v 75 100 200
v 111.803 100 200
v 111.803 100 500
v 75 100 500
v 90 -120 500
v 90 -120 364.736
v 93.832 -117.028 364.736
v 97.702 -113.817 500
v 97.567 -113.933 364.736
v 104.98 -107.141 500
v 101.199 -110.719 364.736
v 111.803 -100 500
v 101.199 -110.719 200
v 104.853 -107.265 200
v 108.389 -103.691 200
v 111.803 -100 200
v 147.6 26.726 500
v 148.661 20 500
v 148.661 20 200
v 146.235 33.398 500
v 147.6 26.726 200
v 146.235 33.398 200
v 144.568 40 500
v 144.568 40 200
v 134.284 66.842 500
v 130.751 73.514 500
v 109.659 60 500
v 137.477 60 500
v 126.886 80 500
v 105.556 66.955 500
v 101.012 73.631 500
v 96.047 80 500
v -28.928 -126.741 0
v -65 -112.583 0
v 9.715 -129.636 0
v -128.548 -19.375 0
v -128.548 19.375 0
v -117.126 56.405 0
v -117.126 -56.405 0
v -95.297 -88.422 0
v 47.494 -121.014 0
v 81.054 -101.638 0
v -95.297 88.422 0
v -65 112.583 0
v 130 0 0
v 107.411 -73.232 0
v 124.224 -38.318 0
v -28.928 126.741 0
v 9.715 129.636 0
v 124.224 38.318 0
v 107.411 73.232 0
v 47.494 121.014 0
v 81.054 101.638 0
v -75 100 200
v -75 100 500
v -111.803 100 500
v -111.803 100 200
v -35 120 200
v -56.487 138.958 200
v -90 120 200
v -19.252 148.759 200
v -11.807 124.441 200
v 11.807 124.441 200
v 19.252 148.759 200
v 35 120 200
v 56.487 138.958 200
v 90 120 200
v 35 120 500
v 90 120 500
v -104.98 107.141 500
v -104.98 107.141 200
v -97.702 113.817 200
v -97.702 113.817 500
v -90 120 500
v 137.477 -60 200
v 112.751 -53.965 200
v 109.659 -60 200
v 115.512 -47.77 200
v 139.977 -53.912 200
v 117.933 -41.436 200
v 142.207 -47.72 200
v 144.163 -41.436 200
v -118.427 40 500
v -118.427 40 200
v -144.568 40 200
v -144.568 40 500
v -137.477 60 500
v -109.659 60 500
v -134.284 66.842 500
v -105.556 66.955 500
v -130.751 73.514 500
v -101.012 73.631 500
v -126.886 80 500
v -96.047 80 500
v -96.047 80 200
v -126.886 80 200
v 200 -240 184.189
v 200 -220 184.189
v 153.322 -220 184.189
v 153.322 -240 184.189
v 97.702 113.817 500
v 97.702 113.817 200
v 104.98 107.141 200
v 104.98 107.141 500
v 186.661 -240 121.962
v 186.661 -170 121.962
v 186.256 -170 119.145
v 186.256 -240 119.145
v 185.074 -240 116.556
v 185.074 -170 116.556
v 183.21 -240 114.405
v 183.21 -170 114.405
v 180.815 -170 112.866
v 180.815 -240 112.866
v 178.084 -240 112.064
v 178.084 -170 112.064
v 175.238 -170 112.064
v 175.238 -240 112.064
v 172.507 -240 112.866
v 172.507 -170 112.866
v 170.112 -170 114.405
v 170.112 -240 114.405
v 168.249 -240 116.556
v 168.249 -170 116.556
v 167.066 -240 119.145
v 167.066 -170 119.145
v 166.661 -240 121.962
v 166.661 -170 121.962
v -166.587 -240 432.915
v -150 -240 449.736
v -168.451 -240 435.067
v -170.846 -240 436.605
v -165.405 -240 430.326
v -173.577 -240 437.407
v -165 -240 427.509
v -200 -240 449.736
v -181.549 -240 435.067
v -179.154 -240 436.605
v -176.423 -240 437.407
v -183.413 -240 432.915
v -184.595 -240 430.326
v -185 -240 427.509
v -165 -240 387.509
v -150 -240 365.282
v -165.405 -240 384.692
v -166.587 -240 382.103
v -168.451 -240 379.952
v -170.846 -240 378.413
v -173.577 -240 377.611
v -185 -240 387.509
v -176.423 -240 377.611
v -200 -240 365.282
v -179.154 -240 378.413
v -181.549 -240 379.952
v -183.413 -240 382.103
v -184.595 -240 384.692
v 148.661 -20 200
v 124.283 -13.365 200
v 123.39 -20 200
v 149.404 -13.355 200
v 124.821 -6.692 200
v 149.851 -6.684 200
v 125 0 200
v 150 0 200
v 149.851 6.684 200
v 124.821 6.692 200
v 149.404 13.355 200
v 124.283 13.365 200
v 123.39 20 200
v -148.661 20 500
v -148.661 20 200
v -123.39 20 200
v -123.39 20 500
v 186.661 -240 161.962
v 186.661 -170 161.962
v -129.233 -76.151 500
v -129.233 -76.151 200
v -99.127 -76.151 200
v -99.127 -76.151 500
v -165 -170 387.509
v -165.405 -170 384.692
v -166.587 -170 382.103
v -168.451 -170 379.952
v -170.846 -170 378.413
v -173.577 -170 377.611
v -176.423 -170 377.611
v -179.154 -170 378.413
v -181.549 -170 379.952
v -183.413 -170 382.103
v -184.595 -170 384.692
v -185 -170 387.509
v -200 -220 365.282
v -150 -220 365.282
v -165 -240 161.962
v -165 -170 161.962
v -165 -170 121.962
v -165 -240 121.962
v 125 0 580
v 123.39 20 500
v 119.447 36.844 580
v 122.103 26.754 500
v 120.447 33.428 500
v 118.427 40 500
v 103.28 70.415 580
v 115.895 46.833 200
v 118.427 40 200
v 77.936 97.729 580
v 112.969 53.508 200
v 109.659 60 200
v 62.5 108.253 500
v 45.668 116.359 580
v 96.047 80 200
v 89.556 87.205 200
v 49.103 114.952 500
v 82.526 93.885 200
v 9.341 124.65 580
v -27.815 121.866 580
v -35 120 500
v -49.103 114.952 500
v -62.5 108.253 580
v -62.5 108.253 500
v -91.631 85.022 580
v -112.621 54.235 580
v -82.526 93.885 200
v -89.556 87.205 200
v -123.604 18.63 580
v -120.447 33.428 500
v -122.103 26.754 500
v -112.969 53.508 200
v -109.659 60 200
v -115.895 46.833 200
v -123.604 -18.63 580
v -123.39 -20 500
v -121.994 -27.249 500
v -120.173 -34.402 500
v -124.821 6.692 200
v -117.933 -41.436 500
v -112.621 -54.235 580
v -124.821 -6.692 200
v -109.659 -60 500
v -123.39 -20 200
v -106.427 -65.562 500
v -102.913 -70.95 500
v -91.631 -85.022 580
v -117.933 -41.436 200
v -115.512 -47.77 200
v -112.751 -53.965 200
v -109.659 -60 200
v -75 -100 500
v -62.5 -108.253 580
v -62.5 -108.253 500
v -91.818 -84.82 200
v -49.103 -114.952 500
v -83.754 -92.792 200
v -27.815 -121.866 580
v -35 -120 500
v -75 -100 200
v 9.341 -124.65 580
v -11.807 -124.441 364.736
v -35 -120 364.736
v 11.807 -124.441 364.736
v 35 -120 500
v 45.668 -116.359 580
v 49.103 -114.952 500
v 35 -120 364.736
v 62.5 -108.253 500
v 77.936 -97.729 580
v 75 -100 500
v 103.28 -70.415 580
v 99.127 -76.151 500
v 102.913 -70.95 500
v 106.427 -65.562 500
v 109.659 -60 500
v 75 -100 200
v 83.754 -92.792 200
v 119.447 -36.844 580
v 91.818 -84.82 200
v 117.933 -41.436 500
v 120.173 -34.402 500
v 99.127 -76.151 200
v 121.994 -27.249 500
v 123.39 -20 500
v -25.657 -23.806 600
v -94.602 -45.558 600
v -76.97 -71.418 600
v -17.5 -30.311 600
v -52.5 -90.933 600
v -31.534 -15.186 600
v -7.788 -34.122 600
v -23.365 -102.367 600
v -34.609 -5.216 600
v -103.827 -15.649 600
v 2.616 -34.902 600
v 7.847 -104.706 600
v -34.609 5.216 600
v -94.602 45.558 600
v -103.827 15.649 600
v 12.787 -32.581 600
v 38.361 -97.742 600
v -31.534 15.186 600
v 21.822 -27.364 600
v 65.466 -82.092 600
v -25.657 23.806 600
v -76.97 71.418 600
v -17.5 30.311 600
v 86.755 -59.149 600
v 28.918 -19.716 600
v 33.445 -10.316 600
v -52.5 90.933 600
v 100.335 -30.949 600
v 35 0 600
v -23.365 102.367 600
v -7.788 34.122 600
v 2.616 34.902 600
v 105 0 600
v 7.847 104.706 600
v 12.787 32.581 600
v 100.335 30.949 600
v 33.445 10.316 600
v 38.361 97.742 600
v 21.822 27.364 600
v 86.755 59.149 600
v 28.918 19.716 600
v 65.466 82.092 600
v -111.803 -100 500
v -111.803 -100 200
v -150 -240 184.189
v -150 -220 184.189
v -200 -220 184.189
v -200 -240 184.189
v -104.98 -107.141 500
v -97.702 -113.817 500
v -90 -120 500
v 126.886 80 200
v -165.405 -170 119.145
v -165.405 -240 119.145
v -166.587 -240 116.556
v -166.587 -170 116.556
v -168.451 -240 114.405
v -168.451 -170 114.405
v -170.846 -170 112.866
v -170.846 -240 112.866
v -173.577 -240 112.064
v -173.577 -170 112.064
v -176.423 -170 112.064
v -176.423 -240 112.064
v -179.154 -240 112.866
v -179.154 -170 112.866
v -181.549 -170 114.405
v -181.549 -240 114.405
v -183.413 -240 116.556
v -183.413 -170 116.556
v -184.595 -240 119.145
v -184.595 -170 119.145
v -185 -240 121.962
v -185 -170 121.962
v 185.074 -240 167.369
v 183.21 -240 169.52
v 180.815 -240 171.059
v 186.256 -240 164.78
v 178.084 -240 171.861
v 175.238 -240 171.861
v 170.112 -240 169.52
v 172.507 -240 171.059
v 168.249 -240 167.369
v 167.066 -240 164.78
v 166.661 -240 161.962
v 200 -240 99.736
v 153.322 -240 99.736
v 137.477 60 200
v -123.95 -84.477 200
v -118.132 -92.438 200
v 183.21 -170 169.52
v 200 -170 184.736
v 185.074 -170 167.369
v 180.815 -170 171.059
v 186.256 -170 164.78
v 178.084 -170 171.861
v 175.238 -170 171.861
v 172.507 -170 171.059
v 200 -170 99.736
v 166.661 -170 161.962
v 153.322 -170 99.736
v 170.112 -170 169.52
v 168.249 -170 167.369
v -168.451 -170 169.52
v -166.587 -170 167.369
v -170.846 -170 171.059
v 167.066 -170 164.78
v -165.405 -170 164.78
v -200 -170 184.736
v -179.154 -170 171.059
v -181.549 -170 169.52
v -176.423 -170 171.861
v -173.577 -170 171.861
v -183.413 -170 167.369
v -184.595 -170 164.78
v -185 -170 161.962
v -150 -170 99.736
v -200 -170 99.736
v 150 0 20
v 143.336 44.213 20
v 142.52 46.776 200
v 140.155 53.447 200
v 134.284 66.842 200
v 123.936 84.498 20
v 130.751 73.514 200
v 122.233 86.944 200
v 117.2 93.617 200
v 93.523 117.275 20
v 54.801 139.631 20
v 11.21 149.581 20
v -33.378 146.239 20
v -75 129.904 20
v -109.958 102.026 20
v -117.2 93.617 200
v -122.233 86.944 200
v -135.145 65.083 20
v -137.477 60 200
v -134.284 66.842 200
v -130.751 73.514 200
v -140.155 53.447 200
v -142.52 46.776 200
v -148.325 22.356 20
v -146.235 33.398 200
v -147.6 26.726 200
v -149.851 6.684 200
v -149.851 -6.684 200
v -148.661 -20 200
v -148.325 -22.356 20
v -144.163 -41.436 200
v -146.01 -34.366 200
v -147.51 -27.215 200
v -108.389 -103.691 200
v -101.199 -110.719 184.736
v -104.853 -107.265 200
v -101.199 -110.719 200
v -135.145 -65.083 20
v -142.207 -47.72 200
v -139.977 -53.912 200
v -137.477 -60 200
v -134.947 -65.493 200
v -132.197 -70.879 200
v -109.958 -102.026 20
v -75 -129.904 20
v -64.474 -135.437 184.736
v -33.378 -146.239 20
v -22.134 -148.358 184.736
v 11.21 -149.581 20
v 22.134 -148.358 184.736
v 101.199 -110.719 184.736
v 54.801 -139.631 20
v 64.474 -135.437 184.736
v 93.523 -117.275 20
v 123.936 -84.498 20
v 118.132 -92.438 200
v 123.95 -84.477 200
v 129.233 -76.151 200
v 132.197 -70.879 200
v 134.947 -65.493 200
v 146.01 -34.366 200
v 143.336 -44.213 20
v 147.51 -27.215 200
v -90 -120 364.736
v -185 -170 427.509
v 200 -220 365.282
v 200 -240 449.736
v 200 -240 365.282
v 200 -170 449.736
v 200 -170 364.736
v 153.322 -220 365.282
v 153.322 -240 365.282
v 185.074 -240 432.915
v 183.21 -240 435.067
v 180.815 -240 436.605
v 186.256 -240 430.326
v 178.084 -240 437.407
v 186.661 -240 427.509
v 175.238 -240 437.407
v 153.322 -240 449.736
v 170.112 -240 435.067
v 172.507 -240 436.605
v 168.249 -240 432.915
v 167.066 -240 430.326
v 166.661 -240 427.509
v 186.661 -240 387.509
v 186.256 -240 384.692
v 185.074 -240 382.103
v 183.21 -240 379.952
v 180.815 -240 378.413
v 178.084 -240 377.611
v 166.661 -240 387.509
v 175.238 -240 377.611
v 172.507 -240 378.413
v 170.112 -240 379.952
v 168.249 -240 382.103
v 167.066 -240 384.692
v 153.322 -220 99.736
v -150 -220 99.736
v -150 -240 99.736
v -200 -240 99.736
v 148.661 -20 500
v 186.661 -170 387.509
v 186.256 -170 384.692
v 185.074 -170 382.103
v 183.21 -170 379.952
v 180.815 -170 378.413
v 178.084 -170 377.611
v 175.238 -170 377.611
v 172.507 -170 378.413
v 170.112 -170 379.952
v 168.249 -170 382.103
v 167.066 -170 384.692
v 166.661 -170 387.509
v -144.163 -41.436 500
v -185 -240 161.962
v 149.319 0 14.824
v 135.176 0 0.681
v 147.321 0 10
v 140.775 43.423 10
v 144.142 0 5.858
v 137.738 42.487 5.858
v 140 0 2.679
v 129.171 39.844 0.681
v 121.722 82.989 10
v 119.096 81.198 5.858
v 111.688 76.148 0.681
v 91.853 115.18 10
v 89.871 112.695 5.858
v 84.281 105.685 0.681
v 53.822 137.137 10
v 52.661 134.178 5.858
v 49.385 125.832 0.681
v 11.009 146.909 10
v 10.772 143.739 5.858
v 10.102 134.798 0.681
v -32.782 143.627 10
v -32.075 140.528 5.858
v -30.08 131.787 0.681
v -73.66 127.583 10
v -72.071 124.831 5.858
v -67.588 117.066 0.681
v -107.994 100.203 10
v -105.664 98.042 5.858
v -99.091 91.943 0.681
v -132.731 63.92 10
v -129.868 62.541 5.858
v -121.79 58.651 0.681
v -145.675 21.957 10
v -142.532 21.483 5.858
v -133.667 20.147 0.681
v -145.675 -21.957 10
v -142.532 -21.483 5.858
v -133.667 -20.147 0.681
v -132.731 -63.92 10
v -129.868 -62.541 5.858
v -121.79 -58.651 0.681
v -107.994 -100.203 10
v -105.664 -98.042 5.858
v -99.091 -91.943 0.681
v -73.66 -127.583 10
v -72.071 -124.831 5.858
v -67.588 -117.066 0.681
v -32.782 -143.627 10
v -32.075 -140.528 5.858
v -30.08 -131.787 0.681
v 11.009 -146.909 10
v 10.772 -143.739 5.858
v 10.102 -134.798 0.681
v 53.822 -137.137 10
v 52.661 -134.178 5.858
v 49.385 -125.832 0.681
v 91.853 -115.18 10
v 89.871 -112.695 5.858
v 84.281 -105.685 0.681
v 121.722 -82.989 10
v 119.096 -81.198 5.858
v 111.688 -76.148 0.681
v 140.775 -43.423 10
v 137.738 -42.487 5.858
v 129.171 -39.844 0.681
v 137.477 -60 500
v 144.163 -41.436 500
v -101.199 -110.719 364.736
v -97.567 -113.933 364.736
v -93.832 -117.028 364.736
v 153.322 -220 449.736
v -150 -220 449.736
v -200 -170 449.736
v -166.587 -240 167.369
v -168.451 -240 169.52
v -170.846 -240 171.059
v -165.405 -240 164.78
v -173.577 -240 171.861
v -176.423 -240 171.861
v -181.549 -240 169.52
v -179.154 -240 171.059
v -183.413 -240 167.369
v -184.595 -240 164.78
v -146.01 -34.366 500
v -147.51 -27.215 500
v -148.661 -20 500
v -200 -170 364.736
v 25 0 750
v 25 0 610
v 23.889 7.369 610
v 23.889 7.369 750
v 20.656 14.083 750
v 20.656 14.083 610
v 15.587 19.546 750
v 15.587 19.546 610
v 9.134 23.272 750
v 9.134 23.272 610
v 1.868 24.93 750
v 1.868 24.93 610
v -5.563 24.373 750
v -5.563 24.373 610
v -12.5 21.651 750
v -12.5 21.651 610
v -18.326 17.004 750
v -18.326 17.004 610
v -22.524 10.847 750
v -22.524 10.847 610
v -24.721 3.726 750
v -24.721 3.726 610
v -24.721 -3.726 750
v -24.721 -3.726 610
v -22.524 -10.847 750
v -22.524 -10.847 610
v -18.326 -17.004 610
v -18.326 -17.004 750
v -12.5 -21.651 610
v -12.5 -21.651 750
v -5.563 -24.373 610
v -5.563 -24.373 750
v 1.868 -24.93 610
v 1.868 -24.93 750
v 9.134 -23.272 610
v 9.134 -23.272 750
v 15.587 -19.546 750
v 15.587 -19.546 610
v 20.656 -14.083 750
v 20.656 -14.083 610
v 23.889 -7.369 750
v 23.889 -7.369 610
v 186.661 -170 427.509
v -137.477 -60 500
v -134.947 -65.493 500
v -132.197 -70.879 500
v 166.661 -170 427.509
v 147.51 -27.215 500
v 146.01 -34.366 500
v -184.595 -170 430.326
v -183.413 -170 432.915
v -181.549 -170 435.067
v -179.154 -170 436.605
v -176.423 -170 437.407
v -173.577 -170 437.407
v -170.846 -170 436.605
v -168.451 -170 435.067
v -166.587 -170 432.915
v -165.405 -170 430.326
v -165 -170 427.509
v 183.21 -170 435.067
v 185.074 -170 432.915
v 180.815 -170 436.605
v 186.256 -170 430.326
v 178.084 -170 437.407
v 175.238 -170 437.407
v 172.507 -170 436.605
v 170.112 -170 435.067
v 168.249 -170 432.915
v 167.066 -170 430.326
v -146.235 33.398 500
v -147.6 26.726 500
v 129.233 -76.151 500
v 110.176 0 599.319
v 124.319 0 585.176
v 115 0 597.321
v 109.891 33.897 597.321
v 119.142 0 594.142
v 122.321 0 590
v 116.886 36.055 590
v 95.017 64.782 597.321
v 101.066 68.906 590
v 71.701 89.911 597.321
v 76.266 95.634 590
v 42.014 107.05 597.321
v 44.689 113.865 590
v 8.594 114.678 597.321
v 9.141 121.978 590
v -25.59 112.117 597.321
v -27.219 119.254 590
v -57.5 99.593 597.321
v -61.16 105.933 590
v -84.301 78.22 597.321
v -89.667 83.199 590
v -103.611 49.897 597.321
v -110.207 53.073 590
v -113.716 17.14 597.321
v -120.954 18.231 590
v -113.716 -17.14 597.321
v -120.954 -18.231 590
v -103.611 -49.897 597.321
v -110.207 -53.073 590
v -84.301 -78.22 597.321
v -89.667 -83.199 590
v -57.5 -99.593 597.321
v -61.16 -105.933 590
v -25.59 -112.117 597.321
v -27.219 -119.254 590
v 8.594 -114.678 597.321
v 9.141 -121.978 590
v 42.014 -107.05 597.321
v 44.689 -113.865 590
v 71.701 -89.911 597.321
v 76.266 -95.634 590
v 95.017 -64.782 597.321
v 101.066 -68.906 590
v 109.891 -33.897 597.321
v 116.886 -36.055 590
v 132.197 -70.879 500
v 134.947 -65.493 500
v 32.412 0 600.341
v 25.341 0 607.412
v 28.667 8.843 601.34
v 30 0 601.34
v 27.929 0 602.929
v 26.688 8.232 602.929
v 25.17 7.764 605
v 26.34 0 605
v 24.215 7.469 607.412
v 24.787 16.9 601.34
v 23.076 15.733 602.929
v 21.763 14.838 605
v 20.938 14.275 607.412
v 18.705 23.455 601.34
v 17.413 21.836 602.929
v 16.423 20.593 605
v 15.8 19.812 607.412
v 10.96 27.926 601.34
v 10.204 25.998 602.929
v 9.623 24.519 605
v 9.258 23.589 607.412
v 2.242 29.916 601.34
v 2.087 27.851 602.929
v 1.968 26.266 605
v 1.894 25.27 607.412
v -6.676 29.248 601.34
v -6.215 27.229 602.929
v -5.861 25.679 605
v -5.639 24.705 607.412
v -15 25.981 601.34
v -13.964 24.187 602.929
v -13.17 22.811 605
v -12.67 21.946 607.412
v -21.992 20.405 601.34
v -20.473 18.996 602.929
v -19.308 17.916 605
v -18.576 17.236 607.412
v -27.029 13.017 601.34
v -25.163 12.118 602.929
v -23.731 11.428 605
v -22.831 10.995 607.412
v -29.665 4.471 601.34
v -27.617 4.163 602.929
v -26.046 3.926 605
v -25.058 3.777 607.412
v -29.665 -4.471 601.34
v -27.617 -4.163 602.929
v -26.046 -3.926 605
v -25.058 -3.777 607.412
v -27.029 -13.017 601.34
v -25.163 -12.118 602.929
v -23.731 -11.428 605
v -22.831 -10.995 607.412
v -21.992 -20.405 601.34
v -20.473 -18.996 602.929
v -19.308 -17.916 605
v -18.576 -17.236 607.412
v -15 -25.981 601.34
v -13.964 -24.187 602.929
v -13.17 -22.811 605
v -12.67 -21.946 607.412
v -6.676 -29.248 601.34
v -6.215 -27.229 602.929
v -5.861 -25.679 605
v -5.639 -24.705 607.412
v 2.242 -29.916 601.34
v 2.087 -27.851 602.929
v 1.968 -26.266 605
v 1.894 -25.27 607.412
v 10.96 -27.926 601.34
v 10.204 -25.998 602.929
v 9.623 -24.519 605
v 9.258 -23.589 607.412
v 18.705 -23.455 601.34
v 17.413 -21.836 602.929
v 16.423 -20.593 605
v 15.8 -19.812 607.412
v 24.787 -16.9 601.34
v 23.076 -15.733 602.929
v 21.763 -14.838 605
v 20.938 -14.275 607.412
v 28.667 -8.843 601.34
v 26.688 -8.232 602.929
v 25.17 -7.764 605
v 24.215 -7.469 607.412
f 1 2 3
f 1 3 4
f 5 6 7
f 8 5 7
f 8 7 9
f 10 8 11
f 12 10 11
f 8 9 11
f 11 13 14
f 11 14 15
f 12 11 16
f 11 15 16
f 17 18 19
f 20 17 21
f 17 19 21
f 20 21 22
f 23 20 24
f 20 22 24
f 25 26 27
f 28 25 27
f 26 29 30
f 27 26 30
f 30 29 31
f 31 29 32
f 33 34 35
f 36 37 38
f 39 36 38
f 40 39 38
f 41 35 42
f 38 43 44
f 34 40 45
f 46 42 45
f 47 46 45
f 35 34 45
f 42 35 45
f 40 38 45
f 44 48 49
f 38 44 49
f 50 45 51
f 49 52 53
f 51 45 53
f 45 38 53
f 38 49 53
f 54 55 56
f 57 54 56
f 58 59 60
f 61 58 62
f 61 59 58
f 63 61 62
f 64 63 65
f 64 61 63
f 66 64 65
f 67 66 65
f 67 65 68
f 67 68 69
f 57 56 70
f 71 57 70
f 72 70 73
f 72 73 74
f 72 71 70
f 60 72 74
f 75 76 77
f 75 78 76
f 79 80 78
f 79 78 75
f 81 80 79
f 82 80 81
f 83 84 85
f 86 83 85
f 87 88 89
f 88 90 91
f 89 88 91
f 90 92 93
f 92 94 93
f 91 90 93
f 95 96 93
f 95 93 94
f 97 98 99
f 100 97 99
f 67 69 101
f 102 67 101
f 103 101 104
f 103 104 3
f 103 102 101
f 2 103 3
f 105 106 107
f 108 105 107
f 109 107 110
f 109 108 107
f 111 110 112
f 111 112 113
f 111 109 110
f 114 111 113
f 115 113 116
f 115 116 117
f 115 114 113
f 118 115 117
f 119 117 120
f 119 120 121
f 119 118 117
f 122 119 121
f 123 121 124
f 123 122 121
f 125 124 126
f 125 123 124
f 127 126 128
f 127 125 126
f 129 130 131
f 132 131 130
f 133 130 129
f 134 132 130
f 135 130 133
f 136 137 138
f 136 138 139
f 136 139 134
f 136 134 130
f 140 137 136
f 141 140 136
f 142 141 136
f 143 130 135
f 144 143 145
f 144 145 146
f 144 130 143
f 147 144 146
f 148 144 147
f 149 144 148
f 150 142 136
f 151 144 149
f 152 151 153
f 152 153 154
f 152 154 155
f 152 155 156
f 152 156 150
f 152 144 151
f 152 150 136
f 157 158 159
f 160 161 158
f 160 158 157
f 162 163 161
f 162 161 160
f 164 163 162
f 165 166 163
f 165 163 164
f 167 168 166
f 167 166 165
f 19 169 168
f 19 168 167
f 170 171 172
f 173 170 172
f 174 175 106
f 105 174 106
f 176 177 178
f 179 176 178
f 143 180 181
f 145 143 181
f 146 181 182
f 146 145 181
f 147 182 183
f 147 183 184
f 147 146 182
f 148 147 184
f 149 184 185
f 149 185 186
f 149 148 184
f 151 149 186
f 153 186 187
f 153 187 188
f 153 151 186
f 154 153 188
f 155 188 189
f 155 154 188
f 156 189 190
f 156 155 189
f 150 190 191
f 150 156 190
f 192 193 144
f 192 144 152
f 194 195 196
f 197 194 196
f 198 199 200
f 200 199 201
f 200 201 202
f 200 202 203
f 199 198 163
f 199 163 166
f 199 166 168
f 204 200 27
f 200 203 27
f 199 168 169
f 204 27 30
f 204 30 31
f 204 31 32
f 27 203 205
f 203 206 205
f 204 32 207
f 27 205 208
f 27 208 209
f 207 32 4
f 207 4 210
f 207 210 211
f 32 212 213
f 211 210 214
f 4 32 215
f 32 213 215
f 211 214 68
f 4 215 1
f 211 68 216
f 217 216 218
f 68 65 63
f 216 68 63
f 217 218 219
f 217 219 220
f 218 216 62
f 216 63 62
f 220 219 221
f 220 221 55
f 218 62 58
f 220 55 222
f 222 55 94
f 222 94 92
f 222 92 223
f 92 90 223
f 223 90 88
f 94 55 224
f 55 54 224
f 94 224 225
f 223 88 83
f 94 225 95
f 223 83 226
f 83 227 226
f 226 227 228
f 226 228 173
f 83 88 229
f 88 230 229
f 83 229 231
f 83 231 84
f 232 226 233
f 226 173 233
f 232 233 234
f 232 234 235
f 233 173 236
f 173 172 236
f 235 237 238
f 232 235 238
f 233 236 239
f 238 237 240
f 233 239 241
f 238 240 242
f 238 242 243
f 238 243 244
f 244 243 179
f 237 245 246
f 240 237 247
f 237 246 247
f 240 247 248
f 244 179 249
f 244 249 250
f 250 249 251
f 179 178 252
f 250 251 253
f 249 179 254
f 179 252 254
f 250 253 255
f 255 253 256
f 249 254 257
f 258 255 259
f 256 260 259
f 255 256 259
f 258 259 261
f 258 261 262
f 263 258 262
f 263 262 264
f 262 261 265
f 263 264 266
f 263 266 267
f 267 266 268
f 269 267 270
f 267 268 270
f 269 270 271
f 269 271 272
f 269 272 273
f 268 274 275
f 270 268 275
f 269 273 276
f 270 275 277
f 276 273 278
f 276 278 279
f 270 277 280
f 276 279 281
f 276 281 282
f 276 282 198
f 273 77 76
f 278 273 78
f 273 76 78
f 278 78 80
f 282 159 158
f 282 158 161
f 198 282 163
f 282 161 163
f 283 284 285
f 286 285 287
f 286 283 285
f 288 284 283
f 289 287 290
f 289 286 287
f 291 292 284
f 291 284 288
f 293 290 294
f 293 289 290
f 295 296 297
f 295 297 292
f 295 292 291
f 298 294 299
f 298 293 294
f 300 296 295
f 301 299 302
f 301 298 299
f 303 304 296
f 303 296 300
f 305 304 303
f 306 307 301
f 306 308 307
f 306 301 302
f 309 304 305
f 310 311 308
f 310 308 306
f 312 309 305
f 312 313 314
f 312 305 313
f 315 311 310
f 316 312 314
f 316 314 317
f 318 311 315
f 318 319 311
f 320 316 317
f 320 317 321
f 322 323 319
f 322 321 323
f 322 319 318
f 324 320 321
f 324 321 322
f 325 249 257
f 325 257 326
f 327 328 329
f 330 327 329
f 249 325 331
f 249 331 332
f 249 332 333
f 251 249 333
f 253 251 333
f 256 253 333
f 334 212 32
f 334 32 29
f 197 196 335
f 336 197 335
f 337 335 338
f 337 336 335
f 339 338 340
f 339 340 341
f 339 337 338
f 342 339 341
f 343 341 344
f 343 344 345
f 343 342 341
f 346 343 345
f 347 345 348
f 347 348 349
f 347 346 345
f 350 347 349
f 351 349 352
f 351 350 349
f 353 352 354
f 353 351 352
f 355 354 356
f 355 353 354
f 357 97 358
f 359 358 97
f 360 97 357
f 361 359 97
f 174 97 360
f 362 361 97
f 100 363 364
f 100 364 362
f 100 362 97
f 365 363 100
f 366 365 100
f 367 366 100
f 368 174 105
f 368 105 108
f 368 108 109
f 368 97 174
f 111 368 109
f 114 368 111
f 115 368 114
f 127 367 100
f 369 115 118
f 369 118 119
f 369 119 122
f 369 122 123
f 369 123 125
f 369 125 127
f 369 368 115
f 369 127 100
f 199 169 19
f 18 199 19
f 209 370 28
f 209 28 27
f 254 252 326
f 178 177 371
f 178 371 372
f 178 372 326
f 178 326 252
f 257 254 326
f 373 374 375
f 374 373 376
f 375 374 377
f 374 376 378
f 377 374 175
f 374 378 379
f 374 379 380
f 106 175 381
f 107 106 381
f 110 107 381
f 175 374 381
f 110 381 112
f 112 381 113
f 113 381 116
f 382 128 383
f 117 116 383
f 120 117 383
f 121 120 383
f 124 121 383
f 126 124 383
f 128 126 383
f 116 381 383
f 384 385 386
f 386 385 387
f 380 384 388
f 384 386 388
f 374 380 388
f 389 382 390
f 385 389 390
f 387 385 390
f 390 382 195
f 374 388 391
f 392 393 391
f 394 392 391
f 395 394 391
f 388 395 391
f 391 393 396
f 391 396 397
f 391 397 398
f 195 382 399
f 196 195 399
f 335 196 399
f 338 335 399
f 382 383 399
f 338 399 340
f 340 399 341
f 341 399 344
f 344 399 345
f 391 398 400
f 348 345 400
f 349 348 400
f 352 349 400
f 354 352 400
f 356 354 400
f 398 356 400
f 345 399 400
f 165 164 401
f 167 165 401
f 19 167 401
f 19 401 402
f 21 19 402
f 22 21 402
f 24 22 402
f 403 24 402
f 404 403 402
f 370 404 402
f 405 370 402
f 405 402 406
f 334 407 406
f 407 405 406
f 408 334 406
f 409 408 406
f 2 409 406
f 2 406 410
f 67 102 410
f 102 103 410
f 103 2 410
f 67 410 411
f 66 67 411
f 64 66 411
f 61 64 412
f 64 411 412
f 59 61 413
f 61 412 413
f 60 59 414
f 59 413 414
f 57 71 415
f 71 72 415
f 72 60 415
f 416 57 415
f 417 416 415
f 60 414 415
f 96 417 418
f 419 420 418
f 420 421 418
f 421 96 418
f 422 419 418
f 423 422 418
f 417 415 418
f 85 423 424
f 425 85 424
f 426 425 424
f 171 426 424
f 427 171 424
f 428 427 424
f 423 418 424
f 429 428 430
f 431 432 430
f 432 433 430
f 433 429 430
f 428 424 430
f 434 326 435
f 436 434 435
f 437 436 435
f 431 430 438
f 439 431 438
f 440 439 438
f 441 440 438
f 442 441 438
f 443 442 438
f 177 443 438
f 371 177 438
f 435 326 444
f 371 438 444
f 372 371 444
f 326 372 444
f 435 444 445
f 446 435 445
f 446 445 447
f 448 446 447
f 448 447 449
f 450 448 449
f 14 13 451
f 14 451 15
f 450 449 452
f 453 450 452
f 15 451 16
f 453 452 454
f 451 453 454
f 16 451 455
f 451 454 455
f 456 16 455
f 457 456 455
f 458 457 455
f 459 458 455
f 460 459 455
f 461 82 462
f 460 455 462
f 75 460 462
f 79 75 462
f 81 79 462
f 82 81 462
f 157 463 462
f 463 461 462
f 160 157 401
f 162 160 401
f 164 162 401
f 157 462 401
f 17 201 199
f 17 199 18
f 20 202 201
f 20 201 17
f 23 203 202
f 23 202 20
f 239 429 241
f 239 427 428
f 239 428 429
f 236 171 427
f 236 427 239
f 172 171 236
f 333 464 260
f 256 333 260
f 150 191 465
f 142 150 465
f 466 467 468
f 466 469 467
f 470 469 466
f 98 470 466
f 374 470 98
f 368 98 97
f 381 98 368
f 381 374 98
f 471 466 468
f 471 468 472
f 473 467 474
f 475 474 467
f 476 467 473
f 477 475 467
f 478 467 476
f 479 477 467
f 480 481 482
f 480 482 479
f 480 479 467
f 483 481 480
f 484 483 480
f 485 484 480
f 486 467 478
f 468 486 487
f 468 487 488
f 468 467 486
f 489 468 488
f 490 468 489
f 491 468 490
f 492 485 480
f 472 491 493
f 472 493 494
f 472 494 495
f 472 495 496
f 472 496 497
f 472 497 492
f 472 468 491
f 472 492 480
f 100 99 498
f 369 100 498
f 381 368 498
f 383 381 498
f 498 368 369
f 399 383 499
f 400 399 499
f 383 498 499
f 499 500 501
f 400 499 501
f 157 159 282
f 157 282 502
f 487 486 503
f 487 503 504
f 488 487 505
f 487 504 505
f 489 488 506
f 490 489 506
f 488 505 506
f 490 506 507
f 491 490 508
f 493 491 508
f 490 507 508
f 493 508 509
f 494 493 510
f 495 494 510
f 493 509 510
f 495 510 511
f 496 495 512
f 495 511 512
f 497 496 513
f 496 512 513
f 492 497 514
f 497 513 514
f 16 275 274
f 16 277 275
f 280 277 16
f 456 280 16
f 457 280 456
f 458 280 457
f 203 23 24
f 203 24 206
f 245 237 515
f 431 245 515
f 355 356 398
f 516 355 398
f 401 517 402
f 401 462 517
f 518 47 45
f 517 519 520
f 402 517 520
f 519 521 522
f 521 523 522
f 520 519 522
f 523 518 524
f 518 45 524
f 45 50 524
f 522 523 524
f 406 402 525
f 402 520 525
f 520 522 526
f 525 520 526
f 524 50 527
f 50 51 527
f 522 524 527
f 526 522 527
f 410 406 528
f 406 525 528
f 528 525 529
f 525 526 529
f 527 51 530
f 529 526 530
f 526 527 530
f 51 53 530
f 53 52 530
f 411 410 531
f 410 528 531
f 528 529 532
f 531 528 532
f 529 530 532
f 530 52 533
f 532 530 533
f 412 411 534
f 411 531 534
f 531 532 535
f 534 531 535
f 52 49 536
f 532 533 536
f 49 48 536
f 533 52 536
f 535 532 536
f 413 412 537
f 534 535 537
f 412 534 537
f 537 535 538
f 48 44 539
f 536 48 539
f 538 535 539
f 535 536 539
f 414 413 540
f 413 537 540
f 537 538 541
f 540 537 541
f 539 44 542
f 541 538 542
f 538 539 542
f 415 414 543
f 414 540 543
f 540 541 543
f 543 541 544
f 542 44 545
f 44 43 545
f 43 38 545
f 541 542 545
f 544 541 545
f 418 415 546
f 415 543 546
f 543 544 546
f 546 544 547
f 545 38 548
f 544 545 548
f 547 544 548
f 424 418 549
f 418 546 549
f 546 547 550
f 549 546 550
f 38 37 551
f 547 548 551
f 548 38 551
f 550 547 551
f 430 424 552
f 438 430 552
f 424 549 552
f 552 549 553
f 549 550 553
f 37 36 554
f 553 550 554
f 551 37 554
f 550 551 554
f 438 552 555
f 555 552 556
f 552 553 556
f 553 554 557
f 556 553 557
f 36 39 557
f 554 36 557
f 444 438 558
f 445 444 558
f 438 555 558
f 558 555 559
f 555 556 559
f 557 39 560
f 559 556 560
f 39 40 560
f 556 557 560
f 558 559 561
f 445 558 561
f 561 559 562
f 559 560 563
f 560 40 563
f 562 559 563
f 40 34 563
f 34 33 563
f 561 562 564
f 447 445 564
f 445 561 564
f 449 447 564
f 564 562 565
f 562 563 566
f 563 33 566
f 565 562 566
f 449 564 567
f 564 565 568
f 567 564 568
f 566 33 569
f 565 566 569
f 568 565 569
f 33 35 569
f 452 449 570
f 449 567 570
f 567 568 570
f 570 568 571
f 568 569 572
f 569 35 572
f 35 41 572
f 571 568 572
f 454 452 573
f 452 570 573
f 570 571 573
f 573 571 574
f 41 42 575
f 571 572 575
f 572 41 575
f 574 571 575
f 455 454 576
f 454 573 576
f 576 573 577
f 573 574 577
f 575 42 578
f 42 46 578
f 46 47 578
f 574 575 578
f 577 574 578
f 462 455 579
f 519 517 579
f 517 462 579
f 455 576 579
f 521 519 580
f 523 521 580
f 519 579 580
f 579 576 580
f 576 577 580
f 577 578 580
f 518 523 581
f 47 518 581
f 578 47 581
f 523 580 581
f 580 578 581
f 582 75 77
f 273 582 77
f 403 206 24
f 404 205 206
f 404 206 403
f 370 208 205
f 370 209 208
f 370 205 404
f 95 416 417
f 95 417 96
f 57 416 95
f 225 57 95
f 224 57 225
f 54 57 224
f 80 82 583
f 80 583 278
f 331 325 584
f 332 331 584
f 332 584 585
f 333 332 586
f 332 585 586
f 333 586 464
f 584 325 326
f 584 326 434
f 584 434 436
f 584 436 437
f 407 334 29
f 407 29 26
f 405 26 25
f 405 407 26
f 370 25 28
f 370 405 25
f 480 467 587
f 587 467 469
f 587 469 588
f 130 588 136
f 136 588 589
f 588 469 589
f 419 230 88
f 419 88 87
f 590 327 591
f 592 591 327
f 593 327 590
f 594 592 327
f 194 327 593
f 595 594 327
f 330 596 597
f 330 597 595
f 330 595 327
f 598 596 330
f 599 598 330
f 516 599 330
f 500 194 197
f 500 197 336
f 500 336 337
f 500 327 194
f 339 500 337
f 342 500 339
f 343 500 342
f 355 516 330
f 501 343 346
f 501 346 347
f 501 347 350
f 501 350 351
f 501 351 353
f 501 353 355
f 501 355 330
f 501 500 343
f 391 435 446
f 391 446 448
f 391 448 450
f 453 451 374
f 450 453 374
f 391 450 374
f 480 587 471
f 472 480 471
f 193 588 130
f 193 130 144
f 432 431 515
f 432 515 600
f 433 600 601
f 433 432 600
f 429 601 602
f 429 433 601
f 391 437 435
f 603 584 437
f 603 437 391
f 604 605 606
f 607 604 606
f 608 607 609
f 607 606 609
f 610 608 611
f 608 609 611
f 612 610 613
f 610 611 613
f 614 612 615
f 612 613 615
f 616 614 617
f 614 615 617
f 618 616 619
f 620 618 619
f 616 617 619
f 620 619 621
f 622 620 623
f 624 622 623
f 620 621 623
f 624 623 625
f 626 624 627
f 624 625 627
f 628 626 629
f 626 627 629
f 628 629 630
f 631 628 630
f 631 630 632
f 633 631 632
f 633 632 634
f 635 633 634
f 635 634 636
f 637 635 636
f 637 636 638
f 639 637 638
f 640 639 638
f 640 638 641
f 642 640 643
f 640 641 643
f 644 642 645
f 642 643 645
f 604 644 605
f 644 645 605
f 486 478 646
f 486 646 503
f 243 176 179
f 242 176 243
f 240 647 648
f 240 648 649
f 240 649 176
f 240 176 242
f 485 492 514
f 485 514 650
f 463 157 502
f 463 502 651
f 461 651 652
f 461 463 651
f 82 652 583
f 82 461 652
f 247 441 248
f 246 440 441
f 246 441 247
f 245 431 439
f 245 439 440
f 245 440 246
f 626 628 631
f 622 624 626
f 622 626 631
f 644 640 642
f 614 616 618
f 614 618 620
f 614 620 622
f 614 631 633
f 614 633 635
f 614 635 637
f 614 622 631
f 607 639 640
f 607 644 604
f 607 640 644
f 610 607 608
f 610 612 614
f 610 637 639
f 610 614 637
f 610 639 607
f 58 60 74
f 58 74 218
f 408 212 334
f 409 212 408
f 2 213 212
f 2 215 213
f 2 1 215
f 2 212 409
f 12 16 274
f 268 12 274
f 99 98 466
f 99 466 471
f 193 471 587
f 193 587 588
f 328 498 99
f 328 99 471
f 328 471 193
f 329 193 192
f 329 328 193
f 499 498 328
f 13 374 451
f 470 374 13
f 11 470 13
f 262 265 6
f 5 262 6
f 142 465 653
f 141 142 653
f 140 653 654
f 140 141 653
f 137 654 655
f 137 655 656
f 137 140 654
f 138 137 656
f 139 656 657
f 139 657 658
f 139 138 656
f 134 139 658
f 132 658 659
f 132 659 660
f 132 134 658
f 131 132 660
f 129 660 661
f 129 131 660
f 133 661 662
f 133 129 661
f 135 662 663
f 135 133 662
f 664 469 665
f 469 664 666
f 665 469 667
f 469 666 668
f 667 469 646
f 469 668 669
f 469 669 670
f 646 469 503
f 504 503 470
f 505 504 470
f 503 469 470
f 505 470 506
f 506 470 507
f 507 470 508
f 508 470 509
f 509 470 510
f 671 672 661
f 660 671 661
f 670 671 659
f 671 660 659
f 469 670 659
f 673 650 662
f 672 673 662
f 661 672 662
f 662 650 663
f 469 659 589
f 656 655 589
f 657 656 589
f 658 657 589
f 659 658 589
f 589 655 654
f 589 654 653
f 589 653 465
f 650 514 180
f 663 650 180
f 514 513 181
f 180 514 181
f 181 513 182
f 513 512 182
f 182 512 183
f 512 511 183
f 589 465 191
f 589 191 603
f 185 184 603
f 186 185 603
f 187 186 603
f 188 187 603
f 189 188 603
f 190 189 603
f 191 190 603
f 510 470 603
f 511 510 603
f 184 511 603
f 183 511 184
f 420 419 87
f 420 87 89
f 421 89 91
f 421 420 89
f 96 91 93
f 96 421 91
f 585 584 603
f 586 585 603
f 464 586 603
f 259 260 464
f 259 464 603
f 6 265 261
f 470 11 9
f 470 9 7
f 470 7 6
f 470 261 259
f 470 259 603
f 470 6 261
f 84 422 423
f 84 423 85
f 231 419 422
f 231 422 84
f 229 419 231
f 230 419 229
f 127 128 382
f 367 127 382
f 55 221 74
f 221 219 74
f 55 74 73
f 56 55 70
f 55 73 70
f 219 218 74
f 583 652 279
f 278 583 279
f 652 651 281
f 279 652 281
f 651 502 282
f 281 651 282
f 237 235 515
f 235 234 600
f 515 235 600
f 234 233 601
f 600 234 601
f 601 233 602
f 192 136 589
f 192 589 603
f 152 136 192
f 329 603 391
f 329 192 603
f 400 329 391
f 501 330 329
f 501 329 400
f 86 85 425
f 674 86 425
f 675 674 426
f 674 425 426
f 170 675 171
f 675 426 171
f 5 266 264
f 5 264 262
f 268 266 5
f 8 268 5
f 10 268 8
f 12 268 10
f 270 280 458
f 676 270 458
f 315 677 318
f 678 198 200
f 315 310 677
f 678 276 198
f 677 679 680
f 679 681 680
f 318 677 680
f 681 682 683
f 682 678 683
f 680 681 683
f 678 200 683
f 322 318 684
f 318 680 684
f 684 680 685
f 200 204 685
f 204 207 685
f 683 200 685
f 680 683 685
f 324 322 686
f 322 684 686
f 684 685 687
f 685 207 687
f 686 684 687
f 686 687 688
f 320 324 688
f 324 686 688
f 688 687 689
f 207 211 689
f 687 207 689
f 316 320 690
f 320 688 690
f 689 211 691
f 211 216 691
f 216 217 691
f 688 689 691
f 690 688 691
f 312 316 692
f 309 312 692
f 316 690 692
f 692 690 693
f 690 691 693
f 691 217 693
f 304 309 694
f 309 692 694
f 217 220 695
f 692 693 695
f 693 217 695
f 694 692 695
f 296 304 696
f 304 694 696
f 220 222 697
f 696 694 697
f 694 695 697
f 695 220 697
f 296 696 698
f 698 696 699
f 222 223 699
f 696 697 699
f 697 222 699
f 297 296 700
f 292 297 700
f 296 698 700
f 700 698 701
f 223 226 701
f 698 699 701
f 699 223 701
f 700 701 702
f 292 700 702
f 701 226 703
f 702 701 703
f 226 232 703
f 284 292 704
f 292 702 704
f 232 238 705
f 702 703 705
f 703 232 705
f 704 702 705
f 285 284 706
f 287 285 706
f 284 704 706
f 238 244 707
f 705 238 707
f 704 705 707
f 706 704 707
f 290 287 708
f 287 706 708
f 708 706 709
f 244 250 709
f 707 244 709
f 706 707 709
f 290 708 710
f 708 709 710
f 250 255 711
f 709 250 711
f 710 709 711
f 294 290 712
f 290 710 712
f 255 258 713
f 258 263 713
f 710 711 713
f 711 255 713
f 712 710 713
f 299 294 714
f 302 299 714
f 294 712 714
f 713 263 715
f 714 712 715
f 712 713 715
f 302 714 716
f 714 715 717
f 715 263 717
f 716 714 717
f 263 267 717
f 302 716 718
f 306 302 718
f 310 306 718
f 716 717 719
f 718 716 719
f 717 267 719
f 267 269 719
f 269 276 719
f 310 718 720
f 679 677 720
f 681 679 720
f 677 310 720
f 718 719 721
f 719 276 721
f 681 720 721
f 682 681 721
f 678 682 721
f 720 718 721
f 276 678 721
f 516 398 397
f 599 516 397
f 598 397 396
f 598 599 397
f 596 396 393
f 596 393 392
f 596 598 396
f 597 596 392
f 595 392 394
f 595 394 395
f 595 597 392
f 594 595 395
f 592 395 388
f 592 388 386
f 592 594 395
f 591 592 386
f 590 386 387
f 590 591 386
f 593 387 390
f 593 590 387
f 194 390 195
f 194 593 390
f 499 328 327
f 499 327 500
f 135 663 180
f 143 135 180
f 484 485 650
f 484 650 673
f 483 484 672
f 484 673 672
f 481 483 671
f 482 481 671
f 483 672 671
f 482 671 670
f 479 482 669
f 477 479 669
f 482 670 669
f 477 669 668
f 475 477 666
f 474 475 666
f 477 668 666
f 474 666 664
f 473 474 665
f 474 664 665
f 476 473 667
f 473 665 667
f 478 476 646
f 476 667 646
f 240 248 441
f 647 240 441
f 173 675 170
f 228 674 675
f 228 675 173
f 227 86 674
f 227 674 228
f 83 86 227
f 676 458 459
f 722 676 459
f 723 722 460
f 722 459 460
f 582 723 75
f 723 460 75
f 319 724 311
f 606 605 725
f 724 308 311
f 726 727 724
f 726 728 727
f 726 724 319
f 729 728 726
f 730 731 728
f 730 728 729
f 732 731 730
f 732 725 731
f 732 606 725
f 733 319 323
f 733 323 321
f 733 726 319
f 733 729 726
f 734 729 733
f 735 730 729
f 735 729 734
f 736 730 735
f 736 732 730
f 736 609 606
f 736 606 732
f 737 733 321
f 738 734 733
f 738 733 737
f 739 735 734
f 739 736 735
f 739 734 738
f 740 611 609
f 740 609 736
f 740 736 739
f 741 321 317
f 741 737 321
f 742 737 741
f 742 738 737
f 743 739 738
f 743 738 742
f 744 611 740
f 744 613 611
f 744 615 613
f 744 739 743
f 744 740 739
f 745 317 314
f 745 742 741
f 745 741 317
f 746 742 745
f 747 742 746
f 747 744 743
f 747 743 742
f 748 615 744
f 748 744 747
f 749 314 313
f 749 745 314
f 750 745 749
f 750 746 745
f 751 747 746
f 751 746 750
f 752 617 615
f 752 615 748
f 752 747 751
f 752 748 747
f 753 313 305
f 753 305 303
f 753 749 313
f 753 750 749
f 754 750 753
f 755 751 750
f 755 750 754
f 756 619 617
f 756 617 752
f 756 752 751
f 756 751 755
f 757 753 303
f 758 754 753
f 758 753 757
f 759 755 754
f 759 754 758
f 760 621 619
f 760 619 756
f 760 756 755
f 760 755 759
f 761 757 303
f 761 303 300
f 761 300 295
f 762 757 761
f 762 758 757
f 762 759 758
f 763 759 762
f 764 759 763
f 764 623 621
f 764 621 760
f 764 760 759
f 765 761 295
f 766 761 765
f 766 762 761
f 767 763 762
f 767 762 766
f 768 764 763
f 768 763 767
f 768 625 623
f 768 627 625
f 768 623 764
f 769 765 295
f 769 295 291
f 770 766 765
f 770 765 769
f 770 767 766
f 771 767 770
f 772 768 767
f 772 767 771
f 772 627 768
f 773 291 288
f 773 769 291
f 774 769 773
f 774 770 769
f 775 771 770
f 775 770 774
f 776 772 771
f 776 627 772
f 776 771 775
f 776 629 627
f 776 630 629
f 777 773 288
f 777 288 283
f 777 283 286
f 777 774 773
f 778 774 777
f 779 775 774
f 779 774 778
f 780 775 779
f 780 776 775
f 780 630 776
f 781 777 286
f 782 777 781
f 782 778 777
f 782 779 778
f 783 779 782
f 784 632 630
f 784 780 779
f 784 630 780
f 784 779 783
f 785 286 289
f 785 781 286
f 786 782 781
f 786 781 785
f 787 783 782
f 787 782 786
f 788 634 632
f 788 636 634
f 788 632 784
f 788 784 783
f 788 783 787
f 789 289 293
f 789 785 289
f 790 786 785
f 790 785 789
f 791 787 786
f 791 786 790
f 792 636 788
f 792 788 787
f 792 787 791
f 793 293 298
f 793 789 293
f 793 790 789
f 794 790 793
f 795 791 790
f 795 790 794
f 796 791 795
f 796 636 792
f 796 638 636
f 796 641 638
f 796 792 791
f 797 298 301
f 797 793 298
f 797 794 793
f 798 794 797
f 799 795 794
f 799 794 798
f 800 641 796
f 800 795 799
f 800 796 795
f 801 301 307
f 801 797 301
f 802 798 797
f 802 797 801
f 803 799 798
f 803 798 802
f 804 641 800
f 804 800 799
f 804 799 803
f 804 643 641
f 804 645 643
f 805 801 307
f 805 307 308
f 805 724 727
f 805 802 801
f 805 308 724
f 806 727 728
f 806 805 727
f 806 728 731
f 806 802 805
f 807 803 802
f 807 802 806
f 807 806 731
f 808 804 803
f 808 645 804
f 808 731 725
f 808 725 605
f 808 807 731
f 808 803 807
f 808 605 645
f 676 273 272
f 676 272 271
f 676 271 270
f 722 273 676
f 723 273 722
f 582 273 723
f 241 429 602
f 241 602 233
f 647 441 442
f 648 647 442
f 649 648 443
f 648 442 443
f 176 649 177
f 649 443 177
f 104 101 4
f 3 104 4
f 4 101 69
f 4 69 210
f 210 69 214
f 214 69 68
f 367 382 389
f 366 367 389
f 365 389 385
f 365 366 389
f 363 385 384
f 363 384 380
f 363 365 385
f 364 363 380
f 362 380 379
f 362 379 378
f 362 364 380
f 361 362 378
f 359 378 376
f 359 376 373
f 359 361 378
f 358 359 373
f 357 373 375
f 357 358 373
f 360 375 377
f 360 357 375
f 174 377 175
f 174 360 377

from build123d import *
from build123d.topology import SkipClean

# Parameters (mm, degrees)
SKETCH1_R            = 150
BOSS_EXTRUDE1_DEPTH  = 200
BOSS_EXTRUDE11_DEPTH = 300
BOSS_EXTRUDE14_START = -300
SKETCH12_R           = 125
BOSS_EXTRUDE14_DEPTH = 400
SKETCH13_W           = 46.677917496
SKETCH13_H           = 84.453402707
SKETCH13_H_2         = 84.453402706
SKETCH13_W_2         = 50
BOSS_EXTRUDE15_DEPTH = 50
SKETCH13_3_W         = 46.677917496
SKETCH13_3_H         = 84.453402706
SKETCH13_3_H_2       = 84.453402707
SKETCH13_3_W_2       = 50
BOSS_EXTRUDE16_DEPTH = 20
BOSS_EXTRUDE17_DEPTH = 90
SKETCH16_R           = 25
BOSS_EXTRUDE18_DEPTH = 150
FILLET2_R            = 10
FILLET3_R            = 20


with BuildPart() as part:
    # Sketch1 → Boss-Extrude1 (new body)
    with BuildSketch(Plane.XY):
        Circle(SKETCH1_R)
    extrude(amount=BOSS_EXTRUDE1_DEPTH)

    # Sketch7 → Boss-Extrude11 (add)
    with SkipClean():  # the faces are left unmerged after this step: merging them gives an invalid solid
        with BuildSketch(Plane.XY.offset(200)):
            with BuildLine():
                Line((-90, 120), (90, 120))
                ThreePointArc((90, 120), (101.396020382, 110.538893837), (111.803398875, 100))
                Line((111.803398875, 100), (-111.803398875, 100))
                ThreePointArc((-111.803398875, 100), (-101.396020382, 110.538893837), (-90, 120))
            make_face()
            with BuildLine():
                Line((-126.885775404, 80), (126.885775404, 80))
                ThreePointArc((126.885775404, 80), (132.559251115, 70.200035213), (137.477270849, 60))
                Line((137.477270849, 60), (-137.477270849, 60))
                ThreePointArc((-137.477270849, 60), (-132.559251115, 70.200035213), (-126.885775404, 80))
            make_face()
            with BuildLine():
                Line((144.16342013, -41.435592144), (-144.16342013, -41.435592144))
                ThreePointArc((-144.16342013, -41.435592144), (-146.803816882, -30.799989431), (-148.660687473, -20))
                Line((-148.660687473, -20), (148.660687473, -20))
                ThreePointArc((148.660687473, -20), (146.803816882, -30.799989431), (144.16342013, -41.435592144))
            make_face()
            with BuildLine():
                Line((111.803398875, -100), (-111.803398875, -100))
                ThreePointArc((-111.803398875, -100), (-101.396020382, -110.538893837), (-90, -120))
                Line((-90, -120), (90, -120))
                ThreePointArc((90, -120), (101.396020382, -110.538893837), (111.803398875, -100))
            make_face()
            with BuildLine():
                Line((144.568322948, 40), (-144.568322948, 40))
                ThreePointArc((-144.568322948, 40), (-146.955139883, 30.069700063), (-148.660687473, 20))
                Line((-148.660687473, 20), (148.660687473, 20))
                ThreePointArc((148.660687473, 20), (146.955139883, 30.069700063), (144.568322948, 40))
            make_face()
            with BuildLine():
                Line((137.477270849, -60), (-137.477270849, -60))
                ThreePointArc((-137.477270849, -60), (-133.599215205, -68.20007109), (-129.232599216, -76.150740639))
                Line((-129.232599216, -76.150740639), (129.232599216, -76.150740639))
                ThreePointArc((129.232599216, -76.150740639), (133.599215205, -68.20007109), (137.477270849, -60))
            make_face()
        extrude(amount=BOSS_EXTRUDE11_DEPTH)



with BuildPart() as body_2:
    # Sketch12 → Boss-Extrude14 (new body)
    with BuildSketch(Plane.XY.offset(500).offset(BOSS_EXTRUDE14_START)):
        Circle(SKETCH12_R)
    extrude(amount=BOSS_EXTRUDE14_DEPTH)


with BuildPart() as body_3:
    # Sketch13 → Boss-Extrude15 (new body)
    # profile 1 of 5: a face of its own
    with BuildSketch(Plane(origin=(0, -220, 0), x_dir=(-1, 0, 0), z_dir=(0, -1, 0))):
        Polygon((150, -99.735715433), (-153.322082504, -99.735715433), (-153.322082504, -184.18911814), (-200, -184.18911814), (-200, -365.282312727), (-153.322082504, -365.282312727), (-153.322082504, -449.735715433), (150, -449.735715433), (150, -365.282312727), (200, -365.282312727), (200, -184.18911814), (150, -184.18911814), align=None)
    # profile 2 of 5: a face of its own
    with BuildSketch(Plane(origin=(0, -220, 0), x_dir=(-1, 0, 0), z_dir=(0, -1, 0))):
        with Locations((-176.661041252, -141.962416787)):
            Rectangle(SKETCH13_W, SKETCH13_H)
        with BuildLine():
            ThreePointArc((-186.661041252, -121.962416787), (-176.661041252, -111.962416787), (-166.661041252, -121.962416787))
            Line((-166.661041252, -121.962416787), (-166.661041252, -161.962416787))
            ThreePointArc((-166.661041252, -161.962416787), (-176.661041252, -171.962416787), (-186.661041252, -161.962416787))
            Line((-186.661041252, -161.962416787), (-186.661041252, -121.962416787))
        make_face(mode=Mode.SUBTRACT)
    # profile 3 of 5: a face of its own
    with BuildSketch(Plane(origin=(0, -220, 0), x_dir=(-1, 0, 0), z_dir=(0, -1, 0))):
        with Locations((-176.661041252, -407.50901408)):
            Rectangle(SKETCH13_W, SKETCH13_H_2)
        with BuildLine():
            Line((-166.661041252, -387.50901408), (-166.661041252, -427.50901408))
            ThreePointArc((-166.661041252, -427.50901408), (-176.661041252, -437.50901408), (-186.661041252, -427.50901408))
            Line((-186.661041252, -427.50901408), (-186.661041252, -387.50901408))
            ThreePointArc((-186.661041252, -387.50901408), (-176.661041252, -377.50901408), (-166.661041252, -387.50901408))
        make_face(mode=Mode.SUBTRACT)
    # profile 4 of 5: a face of its own
    with BuildSketch(Plane(origin=(0, -220, 0), x_dir=(-1, 0, 0), z_dir=(0, -1, 0))):
        with Locations((175, -407.50901408)):
            Rectangle(SKETCH13_W_2, SKETCH13_H_2)
        with BuildLine():
            Line((185, -387.50901408), (185, -427.50901408))
            ThreePointArc((185, -427.50901408), (175, -437.50901408), (165, -427.50901408))
            Line((165, -427.50901408), (165, -387.50901408))
            ThreePointArc((165, -387.50901408), (175, -377.50901408), (185, -387.50901408))
        make_face(mode=Mode.SUBTRACT)
    # profile 5 of 5: a face of its own
    with BuildSketch(Plane(origin=(0, -220, 0), x_dir=(-1, 0, 0), z_dir=(0, -1, 0))):
        with Locations((175, -141.962416787)):
            Rectangle(SKETCH13_W_2, SKETCH13_H)
        with BuildLine():
            ThreePointArc((165, -121.962416787), (175, -111.962416787), (185, -121.962416787))
            Line((185, -121.962416787), (185, -161.962416787))
            ThreePointArc((185, -161.962416787), (175, -171.962416787), (165, -161.962416787))
            Line((165, -161.962416787), (165, -121.962416787))
        make_face(mode=Mode.SUBTRACT)
    extrude(amount=-BOSS_EXTRUDE15_DEPTH)

    # Sketch13<3> → Boss-Extrude16 (add)
    # profile 1 of 4: a face of its own
    with BuildSketch(Plane(origin=(0, -220, 0), x_dir=(-1, 0, 0), z_dir=(0, -1, 0))):
        with Locations((-176.661041252, -407.50901408)):
            Rectangle(SKETCH13_3_W, SKETCH13_3_H)
        with BuildLine():
            Line((-166.661041252, -387.50901408), (-166.661041252, -427.50901408))
            ThreePointArc((-166.661041252, -427.50901408), (-176.661041252, -437.50901408), (-186.661041252, -427.50901408))
            Line((-186.661041252, -427.50901408), (-186.661041252, -387.50901408))
            ThreePointArc((-186.661041252, -387.50901408), (-176.661041252, -377.50901408), (-166.661041252, -387.50901408))
        make_face(mode=Mode.SUBTRACT)
    # profile 2 of 4: a face of its own
    with BuildSketch(Plane(origin=(0, -220, 0), x_dir=(-1, 0, 0), z_dir=(0, -1, 0))):
        with Locations((-176.661041252, -141.962416787)):
            Rectangle(SKETCH13_3_W, SKETCH13_3_H_2)
        with BuildLine():
            ThreePointArc((-186.661041252, -121.962416787), (-176.661041252, -111.962416787), (-166.661041252, -121.962416787))
            Line((-166.661041252, -121.962416787), (-166.661041252, -161.962416787))
            ThreePointArc((-166.661041252, -161.962416787), (-176.661041252, -171.962416787), (-186.661041252, -161.962416787))
            Line((-186.661041252, -161.962416787), (-186.661041252, -121.962416787))
        make_face(mode=Mode.SUBTRACT)
    # profile 3 of 4: a face of its own
    with BuildSketch(Plane(origin=(0, -220, 0), x_dir=(-1, 0, 0), z_dir=(0, -1, 0))):
        with Locations((175, -407.50901408)):
            Rectangle(SKETCH13_3_W_2, SKETCH13_3_H)
        with BuildLine():
            Line((185, -387.50901408), (185, -427.50901408))
            ThreePointArc((185, -427.50901408), (175, -437.50901408), (165, -427.50901408))
            Line((165, -427.50901408), (165, -387.50901408))
            ThreePointArc((165, -387.50901408), (175, -377.50901408), (185, -387.50901408))
        make_face(mode=Mode.SUBTRACT)
    # profile 4 of 4: a face of its own
    with BuildSketch(Plane(origin=(0, -220, 0), x_dir=(-1, 0, 0), z_dir=(0, -1, 0))):
        with Locations((175, -141.962416787)):
            Rectangle(SKETCH13_3_W_2, SKETCH13_3_H_2)
        with BuildLine():
            ThreePointArc((165, -121.962416787), (175, -111.962416787), (185, -121.962416787))
            Line((185, -121.962416787), (185, -161.962416787))
            ThreePointArc((185, -161.962416787), (175, -171.962416787), (165, -161.962416787))
            Line((165, -161.962416787), (165, -121.962416787))
        make_face(mode=Mode.SUBTRACT)
    extrude(amount=BOSS_EXTRUDE16_DEPTH)


with BuildPart() as part_1:
    with SkipClean():  # the faces are left unmerged after this step: merging them gives an invalid solid
        add(part.part)

        add(body_2.part)  # Boss-Extrude17 merges body 2

        add(body_3.part)  # Boss-Extrude17 merges body 3
        # Sketch14 → Boss-Extrude17 (add, symmetric)
        with BuildSketch(Plane.XY.offset(274.735715433)):
            Polygon((-200, -170), (200, -170), (100, -110), (-100, -110), align=None)
        extrude(amount=BOSS_EXTRUDE17_DEPTH, both=True)

    # Sketch16 → Boss-Extrude18 (add)
    with BuildSketch(Plane.XY.offset(600)):
        Circle(SKETCH16_R)
    extrude(amount=BOSS_EXTRUDE18_DEPTH)

    # Fillet2
    fillet2_edges = [part_1.edges().sort_by_distance(p)[0] for p in [
        (-25, 0, 600),
    ]]
    fillet(fillet2_edges, radius=FILLET2_R)

    # Fillet3
    fillet3_edges = [part_1.edges().sort_by_distance(p)[0] for p in [
        (-125, 0, 600),
        (-150, 0, 0),
    ]]
    fillet(fillet3_edges, radius=FILLET3_R)


solid = part_1.part
